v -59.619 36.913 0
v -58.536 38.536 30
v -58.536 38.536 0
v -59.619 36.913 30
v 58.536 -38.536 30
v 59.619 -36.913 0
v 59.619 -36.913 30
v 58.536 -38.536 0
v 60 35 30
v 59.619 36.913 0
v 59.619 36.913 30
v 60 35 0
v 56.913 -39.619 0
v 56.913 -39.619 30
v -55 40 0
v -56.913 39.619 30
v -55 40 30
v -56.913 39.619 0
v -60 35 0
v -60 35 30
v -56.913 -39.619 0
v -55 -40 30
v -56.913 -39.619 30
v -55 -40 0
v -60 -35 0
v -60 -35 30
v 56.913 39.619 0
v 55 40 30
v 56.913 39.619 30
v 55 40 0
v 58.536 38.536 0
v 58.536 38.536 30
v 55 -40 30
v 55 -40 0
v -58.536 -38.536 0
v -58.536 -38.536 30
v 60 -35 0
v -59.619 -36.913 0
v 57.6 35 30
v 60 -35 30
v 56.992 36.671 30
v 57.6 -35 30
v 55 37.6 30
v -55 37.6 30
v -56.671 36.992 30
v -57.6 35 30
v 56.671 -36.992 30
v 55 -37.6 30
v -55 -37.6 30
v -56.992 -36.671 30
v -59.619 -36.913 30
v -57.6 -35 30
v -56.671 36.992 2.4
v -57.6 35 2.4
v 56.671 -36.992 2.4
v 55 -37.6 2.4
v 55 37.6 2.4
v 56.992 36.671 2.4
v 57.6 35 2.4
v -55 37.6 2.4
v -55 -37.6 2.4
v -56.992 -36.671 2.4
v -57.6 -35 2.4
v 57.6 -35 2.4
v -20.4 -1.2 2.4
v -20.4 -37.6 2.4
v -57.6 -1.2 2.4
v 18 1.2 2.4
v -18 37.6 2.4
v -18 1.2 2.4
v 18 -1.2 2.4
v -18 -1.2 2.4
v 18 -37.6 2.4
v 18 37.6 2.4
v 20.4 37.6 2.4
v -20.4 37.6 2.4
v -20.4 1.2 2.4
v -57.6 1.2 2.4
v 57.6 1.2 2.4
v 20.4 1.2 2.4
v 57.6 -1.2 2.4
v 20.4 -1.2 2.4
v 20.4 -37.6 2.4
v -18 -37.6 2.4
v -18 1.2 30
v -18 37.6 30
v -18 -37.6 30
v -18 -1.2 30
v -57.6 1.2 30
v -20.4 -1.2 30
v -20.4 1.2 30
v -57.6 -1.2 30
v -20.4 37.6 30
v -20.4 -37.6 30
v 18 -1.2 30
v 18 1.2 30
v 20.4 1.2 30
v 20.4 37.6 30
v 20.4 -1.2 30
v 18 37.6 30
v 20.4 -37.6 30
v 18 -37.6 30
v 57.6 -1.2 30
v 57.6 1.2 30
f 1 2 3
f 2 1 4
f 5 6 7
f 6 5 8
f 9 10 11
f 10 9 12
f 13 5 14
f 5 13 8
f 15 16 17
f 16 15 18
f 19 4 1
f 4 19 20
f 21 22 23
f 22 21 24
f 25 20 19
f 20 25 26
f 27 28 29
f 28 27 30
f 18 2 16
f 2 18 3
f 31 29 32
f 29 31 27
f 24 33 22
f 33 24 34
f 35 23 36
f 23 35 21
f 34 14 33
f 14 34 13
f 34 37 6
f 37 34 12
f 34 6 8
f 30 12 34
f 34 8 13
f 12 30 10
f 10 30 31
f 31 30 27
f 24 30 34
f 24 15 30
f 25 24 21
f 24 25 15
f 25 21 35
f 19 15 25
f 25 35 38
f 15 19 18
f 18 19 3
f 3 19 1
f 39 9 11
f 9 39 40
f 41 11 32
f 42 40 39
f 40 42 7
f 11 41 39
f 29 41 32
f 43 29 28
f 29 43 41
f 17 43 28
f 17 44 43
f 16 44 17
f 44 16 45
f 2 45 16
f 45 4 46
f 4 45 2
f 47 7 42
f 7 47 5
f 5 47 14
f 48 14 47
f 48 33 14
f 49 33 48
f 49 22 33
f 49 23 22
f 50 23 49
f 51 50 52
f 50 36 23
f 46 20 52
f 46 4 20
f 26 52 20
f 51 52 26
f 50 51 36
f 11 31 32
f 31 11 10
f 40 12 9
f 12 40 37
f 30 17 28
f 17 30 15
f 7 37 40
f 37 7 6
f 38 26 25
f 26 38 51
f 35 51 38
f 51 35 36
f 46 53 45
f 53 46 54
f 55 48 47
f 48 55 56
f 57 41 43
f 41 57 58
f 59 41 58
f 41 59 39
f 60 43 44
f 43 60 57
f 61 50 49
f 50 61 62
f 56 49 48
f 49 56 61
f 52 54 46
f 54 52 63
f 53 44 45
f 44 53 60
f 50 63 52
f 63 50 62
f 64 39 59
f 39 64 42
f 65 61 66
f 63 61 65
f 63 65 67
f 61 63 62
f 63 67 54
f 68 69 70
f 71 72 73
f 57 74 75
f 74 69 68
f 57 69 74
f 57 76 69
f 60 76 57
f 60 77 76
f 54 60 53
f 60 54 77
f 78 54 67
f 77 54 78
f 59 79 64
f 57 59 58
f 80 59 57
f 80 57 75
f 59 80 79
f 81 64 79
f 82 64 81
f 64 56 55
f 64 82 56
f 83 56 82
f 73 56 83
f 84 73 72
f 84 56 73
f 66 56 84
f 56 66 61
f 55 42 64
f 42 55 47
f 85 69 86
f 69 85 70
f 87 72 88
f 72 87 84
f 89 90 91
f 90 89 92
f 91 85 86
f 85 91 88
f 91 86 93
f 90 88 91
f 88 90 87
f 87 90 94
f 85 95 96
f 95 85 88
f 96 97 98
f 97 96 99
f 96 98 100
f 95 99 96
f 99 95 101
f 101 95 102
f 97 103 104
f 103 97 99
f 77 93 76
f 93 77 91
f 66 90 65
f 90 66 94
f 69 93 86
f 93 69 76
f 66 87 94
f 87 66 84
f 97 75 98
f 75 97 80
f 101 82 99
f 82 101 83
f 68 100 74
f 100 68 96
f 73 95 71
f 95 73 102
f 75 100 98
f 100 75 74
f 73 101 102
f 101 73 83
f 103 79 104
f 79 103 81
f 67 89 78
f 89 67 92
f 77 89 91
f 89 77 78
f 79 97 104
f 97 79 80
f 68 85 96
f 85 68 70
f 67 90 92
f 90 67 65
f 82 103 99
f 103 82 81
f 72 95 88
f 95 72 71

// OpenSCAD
// Parametric open-top storage box.
// Printer-ready orientation: z=0 is the bottom face.
// Outer walls have vertical rounded corners via 2D offset + extrude (fast on CGAL).

// Outer dimension in X (mm)
width = 120;
// Outer dimension in Y (mm)
depth = 80;
// Outer dimension in Z (mm)
height = 30;
// Vertical wall thickness (mm)
wall = 2.4;
// Base/floor thickness (mm)
floor = 2.4;
// Outer vertical corner radius (mm)
corner_r = 5;
// Number of cells in X (divider grid)
div_n = 3;
// Number of cells in Y (divider grid)
div_m = 2;

// Derived interior dimensions.
inner_w = width - 2 * wall;
inner_d = depth - 2 * wall;
inner_h = height - floor;
// Cavity corner radius keeps wall thickness ~uniform at corners.
cav_r = max(corner_r - wall, 0.5);
// Clamp helper: inner 2D base sizes must stay positive for offset().
outer_base_x = max(width - 2 * corner_r, 0.1);
outer_base_y = max(depth - 2 * corner_r, 0.1);
cavity_base_x = max(inner_w - 2 * cav_r, 0.1);
cavity_base_y = max(inner_d - 2 * cav_r, 0.1);

// 2D rounded rectangle centred on origin, built with offset (no minkowski/hull).
module rounded_rect_2d(w, d, r, base_x, base_y) {
    offset(r = r)
        square([base_x, base_y], center = true);
}

// Outer solid: extruded rounded rectangle from z=0 to z=height.
module outer_solid() {
    linear_extrude(height = height)
        rounded_rect_2d(width, depth, corner_r, outer_base_x, outer_base_y);
}

// Cavity solid to subtract: leaves `wall` side walls and `floor` base.
// Extended 1mm above the top so the box is guaranteed open.
module cavity_solid() {
    translate([0, 0, floor])
        linear_extrude(height = inner_h + 1)
            rounded_rect_2d(inner_w, inner_d, cav_r, cavity_base_x, cavity_base_y);
}

// Divider positions: evenly spaced so the cavity splits into div_n x div_m cells.
module dividers() {
    // Walls perpendicular to X (span full inner depth). Count: div_n - 1.
    for (i = [1 : div_n - 1]) {
        x = -inner_w / 2 + i * inner_w / div_n;
        translate([x, 0, floor + inner_h / 2])
            cube([wall, inner_d, inner_h], center = true);
    }
    // Walls perpendicular to Y (span full inner width). Count: div_m - 1.
    for (j = [1 : div_m - 1]) {
        y = -inner_d / 2 + j * inner_d / div_m;
        translate([0, y, floor + inner_h / 2])
            cube([inner_w, wall, inner_h], center = true);
    }
}

// Final part: outer minus cavity, plus internal divider grid.
difference() {
    outer_solid();
    cavity_solid();
}
dividers();
